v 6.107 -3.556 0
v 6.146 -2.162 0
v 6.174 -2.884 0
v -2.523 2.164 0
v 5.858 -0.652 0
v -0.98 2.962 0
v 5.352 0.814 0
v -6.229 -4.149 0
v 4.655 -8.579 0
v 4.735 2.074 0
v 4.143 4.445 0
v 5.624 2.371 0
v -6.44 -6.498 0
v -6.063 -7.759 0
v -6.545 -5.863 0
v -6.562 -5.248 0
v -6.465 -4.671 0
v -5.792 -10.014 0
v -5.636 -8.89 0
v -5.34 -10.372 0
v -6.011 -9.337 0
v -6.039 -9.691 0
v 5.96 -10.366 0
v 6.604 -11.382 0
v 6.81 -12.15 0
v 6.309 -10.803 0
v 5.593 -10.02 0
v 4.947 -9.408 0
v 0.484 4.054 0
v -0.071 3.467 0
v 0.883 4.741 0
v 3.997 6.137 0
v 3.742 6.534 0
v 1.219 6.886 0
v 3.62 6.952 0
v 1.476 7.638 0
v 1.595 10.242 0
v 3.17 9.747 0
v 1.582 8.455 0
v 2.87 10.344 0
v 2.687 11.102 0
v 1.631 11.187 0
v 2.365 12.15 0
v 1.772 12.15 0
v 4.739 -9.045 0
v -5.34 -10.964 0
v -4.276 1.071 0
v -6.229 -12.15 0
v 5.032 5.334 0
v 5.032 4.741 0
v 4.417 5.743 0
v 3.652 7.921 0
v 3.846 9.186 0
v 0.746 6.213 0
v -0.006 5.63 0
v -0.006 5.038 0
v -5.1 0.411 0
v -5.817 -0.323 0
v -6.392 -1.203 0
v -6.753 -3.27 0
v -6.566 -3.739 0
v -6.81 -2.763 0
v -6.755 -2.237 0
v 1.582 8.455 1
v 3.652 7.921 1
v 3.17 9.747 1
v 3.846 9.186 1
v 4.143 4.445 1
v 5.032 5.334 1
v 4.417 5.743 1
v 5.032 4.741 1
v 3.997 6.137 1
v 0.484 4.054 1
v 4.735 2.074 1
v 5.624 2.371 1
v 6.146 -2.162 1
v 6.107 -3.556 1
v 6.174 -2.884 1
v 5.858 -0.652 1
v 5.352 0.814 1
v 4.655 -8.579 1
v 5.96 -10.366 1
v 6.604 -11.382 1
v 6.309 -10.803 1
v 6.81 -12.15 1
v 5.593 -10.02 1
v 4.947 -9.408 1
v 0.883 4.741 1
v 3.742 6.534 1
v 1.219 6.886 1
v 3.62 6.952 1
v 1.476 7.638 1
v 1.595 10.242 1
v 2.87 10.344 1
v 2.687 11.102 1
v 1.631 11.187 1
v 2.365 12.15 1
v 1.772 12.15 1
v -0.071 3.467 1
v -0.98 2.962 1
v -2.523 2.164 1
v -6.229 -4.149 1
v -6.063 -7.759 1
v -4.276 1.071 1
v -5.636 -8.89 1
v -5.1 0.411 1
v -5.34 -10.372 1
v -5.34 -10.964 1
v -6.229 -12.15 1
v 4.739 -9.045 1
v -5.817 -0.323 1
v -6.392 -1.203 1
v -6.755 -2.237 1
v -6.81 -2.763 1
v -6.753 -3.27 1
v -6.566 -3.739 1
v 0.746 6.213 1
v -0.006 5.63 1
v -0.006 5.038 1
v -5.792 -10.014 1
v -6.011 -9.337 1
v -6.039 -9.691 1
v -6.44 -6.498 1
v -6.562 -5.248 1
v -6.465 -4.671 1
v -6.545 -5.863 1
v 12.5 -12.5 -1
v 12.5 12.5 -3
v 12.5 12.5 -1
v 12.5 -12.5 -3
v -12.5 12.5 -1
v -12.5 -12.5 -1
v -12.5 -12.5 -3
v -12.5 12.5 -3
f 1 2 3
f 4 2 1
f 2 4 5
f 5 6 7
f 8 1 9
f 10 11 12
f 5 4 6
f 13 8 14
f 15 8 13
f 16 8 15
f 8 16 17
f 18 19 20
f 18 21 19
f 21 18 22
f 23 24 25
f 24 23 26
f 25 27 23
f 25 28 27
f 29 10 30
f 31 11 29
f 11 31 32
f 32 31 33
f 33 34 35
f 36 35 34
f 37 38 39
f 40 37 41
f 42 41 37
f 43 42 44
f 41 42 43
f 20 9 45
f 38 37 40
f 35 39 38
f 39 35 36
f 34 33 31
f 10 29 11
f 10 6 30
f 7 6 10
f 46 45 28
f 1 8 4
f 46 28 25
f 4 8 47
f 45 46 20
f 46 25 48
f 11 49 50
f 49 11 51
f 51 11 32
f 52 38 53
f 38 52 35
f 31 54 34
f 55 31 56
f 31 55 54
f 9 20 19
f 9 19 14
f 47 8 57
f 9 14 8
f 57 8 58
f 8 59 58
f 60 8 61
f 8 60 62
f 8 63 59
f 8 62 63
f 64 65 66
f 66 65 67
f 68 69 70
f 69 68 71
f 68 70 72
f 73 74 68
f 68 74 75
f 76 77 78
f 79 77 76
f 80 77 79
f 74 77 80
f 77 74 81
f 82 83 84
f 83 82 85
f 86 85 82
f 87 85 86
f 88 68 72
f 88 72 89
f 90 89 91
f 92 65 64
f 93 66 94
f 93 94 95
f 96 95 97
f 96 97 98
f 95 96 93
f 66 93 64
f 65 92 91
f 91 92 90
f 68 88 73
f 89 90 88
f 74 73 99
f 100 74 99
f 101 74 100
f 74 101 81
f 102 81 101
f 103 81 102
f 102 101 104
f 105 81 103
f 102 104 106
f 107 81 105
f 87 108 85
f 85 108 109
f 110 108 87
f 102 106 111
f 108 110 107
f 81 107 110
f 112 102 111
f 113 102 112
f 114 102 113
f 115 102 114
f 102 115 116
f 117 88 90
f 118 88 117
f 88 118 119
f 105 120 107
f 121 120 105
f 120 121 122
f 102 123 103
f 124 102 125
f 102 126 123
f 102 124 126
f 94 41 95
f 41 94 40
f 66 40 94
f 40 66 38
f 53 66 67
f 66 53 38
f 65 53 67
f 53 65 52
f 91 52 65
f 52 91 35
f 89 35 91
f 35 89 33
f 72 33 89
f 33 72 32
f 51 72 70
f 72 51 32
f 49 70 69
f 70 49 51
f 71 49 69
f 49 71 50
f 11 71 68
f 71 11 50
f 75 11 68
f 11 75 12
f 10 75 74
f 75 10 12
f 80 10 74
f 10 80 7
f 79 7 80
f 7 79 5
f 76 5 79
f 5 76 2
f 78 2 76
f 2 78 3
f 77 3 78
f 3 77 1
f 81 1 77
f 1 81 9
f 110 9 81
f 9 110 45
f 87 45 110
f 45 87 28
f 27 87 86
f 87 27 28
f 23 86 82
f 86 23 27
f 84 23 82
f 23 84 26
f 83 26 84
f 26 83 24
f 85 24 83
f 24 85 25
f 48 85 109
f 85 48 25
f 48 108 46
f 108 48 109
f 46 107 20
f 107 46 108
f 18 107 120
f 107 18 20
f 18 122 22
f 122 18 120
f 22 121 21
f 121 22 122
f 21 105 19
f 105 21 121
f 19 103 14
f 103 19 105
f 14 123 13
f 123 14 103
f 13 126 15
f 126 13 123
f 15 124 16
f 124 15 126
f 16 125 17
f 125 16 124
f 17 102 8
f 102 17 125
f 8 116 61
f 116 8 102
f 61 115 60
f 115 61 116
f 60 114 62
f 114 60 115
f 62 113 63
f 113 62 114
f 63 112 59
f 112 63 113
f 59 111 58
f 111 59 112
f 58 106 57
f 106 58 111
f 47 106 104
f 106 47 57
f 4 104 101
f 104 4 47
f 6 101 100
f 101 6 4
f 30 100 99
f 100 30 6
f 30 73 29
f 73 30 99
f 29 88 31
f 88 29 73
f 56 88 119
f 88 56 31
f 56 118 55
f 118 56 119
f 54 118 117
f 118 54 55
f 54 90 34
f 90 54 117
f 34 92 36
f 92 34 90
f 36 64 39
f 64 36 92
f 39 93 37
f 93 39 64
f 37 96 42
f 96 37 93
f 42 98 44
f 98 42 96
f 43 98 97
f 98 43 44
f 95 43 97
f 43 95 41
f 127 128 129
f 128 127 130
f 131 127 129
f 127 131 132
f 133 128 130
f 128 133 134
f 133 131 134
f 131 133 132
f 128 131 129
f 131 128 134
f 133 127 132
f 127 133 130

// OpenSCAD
// file: fidget-outline.scad
// Module names are of the form poly_<inkscape-path-id>().  As a result,
// you can associate a polygon in this OpenSCAD program with the corresponding
// SVG element in the Inkscape document by looking for the XML element with
// the attribute id="inkscape-path-id".

module fidgetOutline(height = 1)
{
    scale([25.4/90, -25.4/90, 1]) 
    union()
    {
        linear_extrude(height = height)
        polygon([[7.979365,-41.000000],[9.067178,-37.465938],[9.684365,-34.905000],[10.699053,-32.891562],[12.979365,-31.000000],[12.323271,-26.731406],[12.215615,-23.461250],[12.627900,-22.050879],[13.489834,-20.710469],[14.905596,-19.380137],[16.979365,-18.000000],[16.979365,-16.000000],[13.979365,-15.000000],[18.979365,-8.000000],[15.979365,-7.000000],[18.059834,-2.745938],[19.768115,2.200000],[20.739521,7.295937],[20.834932,9.730820],[20.609365,12.000000],[15.709365,28.950000],[15.992627,30.524336],[16.694834,31.749688],[18.875615,33.812500],[20.113955,34.979492],[21.290771,36.456563],[22.285947,38.408477],[22.979365,41.000000],[-21.020635,41.000000],[-18.020635,37.000000],[-18.020635,35.000000],[-19.546572,33.794062],[-20.380635,32.702500],[-20.284697,31.509687],[-19.020635,30.000000],[-20.460947,26.182344],[-21.730635,21.928750],[-22.087627,19.785840],[-22.145322,17.710781],[-21.818174,15.762520],[-21.020635,14.000000],[-22.156514,12.616348],[-22.787666,11.036406],[-22.979365,9.325449],[-22.796885,7.548750],[-21.570479,4.059219],[-19.630635,1.090000],[-17.209756,-1.388535],[-14.431104,-3.612656],[-8.514385,-7.303750],[-3.308291,-9.995469],[-0.240635,-11.700000],[1.631865,-13.681250],[2.979365,-16.000000],[-0.020635,-17.000000],[-0.020635,-19.000000],[2.518057,-20.966191],[4.113271,-23.237656],[4.981221,-25.773730],[5.338115,-28.533750],[5.383584,-34.562969],[5.504580,-37.750840],[5.979365,-41.000000],[7.979365,-41.000000]]);
    }
}

module fidgetOutlineThumbnail(height = 1)
{
    xyScale = 1.05;
    
    scale([xyScale, xyScale, 1])
    fidgetOutline(height = height);
}
// file: ../thumbnail-background.scad
module thumbnailBackground()
{
	color("green")
	translate([0, 0, -2])
	cube([25, 25, 2], center=true);	
}
// main file
use <../../external-resources/thumbnail-background.scad>
use <fidget-outline.scad>

fidgetOutlineThumbnail();
thumbnailBackground();
